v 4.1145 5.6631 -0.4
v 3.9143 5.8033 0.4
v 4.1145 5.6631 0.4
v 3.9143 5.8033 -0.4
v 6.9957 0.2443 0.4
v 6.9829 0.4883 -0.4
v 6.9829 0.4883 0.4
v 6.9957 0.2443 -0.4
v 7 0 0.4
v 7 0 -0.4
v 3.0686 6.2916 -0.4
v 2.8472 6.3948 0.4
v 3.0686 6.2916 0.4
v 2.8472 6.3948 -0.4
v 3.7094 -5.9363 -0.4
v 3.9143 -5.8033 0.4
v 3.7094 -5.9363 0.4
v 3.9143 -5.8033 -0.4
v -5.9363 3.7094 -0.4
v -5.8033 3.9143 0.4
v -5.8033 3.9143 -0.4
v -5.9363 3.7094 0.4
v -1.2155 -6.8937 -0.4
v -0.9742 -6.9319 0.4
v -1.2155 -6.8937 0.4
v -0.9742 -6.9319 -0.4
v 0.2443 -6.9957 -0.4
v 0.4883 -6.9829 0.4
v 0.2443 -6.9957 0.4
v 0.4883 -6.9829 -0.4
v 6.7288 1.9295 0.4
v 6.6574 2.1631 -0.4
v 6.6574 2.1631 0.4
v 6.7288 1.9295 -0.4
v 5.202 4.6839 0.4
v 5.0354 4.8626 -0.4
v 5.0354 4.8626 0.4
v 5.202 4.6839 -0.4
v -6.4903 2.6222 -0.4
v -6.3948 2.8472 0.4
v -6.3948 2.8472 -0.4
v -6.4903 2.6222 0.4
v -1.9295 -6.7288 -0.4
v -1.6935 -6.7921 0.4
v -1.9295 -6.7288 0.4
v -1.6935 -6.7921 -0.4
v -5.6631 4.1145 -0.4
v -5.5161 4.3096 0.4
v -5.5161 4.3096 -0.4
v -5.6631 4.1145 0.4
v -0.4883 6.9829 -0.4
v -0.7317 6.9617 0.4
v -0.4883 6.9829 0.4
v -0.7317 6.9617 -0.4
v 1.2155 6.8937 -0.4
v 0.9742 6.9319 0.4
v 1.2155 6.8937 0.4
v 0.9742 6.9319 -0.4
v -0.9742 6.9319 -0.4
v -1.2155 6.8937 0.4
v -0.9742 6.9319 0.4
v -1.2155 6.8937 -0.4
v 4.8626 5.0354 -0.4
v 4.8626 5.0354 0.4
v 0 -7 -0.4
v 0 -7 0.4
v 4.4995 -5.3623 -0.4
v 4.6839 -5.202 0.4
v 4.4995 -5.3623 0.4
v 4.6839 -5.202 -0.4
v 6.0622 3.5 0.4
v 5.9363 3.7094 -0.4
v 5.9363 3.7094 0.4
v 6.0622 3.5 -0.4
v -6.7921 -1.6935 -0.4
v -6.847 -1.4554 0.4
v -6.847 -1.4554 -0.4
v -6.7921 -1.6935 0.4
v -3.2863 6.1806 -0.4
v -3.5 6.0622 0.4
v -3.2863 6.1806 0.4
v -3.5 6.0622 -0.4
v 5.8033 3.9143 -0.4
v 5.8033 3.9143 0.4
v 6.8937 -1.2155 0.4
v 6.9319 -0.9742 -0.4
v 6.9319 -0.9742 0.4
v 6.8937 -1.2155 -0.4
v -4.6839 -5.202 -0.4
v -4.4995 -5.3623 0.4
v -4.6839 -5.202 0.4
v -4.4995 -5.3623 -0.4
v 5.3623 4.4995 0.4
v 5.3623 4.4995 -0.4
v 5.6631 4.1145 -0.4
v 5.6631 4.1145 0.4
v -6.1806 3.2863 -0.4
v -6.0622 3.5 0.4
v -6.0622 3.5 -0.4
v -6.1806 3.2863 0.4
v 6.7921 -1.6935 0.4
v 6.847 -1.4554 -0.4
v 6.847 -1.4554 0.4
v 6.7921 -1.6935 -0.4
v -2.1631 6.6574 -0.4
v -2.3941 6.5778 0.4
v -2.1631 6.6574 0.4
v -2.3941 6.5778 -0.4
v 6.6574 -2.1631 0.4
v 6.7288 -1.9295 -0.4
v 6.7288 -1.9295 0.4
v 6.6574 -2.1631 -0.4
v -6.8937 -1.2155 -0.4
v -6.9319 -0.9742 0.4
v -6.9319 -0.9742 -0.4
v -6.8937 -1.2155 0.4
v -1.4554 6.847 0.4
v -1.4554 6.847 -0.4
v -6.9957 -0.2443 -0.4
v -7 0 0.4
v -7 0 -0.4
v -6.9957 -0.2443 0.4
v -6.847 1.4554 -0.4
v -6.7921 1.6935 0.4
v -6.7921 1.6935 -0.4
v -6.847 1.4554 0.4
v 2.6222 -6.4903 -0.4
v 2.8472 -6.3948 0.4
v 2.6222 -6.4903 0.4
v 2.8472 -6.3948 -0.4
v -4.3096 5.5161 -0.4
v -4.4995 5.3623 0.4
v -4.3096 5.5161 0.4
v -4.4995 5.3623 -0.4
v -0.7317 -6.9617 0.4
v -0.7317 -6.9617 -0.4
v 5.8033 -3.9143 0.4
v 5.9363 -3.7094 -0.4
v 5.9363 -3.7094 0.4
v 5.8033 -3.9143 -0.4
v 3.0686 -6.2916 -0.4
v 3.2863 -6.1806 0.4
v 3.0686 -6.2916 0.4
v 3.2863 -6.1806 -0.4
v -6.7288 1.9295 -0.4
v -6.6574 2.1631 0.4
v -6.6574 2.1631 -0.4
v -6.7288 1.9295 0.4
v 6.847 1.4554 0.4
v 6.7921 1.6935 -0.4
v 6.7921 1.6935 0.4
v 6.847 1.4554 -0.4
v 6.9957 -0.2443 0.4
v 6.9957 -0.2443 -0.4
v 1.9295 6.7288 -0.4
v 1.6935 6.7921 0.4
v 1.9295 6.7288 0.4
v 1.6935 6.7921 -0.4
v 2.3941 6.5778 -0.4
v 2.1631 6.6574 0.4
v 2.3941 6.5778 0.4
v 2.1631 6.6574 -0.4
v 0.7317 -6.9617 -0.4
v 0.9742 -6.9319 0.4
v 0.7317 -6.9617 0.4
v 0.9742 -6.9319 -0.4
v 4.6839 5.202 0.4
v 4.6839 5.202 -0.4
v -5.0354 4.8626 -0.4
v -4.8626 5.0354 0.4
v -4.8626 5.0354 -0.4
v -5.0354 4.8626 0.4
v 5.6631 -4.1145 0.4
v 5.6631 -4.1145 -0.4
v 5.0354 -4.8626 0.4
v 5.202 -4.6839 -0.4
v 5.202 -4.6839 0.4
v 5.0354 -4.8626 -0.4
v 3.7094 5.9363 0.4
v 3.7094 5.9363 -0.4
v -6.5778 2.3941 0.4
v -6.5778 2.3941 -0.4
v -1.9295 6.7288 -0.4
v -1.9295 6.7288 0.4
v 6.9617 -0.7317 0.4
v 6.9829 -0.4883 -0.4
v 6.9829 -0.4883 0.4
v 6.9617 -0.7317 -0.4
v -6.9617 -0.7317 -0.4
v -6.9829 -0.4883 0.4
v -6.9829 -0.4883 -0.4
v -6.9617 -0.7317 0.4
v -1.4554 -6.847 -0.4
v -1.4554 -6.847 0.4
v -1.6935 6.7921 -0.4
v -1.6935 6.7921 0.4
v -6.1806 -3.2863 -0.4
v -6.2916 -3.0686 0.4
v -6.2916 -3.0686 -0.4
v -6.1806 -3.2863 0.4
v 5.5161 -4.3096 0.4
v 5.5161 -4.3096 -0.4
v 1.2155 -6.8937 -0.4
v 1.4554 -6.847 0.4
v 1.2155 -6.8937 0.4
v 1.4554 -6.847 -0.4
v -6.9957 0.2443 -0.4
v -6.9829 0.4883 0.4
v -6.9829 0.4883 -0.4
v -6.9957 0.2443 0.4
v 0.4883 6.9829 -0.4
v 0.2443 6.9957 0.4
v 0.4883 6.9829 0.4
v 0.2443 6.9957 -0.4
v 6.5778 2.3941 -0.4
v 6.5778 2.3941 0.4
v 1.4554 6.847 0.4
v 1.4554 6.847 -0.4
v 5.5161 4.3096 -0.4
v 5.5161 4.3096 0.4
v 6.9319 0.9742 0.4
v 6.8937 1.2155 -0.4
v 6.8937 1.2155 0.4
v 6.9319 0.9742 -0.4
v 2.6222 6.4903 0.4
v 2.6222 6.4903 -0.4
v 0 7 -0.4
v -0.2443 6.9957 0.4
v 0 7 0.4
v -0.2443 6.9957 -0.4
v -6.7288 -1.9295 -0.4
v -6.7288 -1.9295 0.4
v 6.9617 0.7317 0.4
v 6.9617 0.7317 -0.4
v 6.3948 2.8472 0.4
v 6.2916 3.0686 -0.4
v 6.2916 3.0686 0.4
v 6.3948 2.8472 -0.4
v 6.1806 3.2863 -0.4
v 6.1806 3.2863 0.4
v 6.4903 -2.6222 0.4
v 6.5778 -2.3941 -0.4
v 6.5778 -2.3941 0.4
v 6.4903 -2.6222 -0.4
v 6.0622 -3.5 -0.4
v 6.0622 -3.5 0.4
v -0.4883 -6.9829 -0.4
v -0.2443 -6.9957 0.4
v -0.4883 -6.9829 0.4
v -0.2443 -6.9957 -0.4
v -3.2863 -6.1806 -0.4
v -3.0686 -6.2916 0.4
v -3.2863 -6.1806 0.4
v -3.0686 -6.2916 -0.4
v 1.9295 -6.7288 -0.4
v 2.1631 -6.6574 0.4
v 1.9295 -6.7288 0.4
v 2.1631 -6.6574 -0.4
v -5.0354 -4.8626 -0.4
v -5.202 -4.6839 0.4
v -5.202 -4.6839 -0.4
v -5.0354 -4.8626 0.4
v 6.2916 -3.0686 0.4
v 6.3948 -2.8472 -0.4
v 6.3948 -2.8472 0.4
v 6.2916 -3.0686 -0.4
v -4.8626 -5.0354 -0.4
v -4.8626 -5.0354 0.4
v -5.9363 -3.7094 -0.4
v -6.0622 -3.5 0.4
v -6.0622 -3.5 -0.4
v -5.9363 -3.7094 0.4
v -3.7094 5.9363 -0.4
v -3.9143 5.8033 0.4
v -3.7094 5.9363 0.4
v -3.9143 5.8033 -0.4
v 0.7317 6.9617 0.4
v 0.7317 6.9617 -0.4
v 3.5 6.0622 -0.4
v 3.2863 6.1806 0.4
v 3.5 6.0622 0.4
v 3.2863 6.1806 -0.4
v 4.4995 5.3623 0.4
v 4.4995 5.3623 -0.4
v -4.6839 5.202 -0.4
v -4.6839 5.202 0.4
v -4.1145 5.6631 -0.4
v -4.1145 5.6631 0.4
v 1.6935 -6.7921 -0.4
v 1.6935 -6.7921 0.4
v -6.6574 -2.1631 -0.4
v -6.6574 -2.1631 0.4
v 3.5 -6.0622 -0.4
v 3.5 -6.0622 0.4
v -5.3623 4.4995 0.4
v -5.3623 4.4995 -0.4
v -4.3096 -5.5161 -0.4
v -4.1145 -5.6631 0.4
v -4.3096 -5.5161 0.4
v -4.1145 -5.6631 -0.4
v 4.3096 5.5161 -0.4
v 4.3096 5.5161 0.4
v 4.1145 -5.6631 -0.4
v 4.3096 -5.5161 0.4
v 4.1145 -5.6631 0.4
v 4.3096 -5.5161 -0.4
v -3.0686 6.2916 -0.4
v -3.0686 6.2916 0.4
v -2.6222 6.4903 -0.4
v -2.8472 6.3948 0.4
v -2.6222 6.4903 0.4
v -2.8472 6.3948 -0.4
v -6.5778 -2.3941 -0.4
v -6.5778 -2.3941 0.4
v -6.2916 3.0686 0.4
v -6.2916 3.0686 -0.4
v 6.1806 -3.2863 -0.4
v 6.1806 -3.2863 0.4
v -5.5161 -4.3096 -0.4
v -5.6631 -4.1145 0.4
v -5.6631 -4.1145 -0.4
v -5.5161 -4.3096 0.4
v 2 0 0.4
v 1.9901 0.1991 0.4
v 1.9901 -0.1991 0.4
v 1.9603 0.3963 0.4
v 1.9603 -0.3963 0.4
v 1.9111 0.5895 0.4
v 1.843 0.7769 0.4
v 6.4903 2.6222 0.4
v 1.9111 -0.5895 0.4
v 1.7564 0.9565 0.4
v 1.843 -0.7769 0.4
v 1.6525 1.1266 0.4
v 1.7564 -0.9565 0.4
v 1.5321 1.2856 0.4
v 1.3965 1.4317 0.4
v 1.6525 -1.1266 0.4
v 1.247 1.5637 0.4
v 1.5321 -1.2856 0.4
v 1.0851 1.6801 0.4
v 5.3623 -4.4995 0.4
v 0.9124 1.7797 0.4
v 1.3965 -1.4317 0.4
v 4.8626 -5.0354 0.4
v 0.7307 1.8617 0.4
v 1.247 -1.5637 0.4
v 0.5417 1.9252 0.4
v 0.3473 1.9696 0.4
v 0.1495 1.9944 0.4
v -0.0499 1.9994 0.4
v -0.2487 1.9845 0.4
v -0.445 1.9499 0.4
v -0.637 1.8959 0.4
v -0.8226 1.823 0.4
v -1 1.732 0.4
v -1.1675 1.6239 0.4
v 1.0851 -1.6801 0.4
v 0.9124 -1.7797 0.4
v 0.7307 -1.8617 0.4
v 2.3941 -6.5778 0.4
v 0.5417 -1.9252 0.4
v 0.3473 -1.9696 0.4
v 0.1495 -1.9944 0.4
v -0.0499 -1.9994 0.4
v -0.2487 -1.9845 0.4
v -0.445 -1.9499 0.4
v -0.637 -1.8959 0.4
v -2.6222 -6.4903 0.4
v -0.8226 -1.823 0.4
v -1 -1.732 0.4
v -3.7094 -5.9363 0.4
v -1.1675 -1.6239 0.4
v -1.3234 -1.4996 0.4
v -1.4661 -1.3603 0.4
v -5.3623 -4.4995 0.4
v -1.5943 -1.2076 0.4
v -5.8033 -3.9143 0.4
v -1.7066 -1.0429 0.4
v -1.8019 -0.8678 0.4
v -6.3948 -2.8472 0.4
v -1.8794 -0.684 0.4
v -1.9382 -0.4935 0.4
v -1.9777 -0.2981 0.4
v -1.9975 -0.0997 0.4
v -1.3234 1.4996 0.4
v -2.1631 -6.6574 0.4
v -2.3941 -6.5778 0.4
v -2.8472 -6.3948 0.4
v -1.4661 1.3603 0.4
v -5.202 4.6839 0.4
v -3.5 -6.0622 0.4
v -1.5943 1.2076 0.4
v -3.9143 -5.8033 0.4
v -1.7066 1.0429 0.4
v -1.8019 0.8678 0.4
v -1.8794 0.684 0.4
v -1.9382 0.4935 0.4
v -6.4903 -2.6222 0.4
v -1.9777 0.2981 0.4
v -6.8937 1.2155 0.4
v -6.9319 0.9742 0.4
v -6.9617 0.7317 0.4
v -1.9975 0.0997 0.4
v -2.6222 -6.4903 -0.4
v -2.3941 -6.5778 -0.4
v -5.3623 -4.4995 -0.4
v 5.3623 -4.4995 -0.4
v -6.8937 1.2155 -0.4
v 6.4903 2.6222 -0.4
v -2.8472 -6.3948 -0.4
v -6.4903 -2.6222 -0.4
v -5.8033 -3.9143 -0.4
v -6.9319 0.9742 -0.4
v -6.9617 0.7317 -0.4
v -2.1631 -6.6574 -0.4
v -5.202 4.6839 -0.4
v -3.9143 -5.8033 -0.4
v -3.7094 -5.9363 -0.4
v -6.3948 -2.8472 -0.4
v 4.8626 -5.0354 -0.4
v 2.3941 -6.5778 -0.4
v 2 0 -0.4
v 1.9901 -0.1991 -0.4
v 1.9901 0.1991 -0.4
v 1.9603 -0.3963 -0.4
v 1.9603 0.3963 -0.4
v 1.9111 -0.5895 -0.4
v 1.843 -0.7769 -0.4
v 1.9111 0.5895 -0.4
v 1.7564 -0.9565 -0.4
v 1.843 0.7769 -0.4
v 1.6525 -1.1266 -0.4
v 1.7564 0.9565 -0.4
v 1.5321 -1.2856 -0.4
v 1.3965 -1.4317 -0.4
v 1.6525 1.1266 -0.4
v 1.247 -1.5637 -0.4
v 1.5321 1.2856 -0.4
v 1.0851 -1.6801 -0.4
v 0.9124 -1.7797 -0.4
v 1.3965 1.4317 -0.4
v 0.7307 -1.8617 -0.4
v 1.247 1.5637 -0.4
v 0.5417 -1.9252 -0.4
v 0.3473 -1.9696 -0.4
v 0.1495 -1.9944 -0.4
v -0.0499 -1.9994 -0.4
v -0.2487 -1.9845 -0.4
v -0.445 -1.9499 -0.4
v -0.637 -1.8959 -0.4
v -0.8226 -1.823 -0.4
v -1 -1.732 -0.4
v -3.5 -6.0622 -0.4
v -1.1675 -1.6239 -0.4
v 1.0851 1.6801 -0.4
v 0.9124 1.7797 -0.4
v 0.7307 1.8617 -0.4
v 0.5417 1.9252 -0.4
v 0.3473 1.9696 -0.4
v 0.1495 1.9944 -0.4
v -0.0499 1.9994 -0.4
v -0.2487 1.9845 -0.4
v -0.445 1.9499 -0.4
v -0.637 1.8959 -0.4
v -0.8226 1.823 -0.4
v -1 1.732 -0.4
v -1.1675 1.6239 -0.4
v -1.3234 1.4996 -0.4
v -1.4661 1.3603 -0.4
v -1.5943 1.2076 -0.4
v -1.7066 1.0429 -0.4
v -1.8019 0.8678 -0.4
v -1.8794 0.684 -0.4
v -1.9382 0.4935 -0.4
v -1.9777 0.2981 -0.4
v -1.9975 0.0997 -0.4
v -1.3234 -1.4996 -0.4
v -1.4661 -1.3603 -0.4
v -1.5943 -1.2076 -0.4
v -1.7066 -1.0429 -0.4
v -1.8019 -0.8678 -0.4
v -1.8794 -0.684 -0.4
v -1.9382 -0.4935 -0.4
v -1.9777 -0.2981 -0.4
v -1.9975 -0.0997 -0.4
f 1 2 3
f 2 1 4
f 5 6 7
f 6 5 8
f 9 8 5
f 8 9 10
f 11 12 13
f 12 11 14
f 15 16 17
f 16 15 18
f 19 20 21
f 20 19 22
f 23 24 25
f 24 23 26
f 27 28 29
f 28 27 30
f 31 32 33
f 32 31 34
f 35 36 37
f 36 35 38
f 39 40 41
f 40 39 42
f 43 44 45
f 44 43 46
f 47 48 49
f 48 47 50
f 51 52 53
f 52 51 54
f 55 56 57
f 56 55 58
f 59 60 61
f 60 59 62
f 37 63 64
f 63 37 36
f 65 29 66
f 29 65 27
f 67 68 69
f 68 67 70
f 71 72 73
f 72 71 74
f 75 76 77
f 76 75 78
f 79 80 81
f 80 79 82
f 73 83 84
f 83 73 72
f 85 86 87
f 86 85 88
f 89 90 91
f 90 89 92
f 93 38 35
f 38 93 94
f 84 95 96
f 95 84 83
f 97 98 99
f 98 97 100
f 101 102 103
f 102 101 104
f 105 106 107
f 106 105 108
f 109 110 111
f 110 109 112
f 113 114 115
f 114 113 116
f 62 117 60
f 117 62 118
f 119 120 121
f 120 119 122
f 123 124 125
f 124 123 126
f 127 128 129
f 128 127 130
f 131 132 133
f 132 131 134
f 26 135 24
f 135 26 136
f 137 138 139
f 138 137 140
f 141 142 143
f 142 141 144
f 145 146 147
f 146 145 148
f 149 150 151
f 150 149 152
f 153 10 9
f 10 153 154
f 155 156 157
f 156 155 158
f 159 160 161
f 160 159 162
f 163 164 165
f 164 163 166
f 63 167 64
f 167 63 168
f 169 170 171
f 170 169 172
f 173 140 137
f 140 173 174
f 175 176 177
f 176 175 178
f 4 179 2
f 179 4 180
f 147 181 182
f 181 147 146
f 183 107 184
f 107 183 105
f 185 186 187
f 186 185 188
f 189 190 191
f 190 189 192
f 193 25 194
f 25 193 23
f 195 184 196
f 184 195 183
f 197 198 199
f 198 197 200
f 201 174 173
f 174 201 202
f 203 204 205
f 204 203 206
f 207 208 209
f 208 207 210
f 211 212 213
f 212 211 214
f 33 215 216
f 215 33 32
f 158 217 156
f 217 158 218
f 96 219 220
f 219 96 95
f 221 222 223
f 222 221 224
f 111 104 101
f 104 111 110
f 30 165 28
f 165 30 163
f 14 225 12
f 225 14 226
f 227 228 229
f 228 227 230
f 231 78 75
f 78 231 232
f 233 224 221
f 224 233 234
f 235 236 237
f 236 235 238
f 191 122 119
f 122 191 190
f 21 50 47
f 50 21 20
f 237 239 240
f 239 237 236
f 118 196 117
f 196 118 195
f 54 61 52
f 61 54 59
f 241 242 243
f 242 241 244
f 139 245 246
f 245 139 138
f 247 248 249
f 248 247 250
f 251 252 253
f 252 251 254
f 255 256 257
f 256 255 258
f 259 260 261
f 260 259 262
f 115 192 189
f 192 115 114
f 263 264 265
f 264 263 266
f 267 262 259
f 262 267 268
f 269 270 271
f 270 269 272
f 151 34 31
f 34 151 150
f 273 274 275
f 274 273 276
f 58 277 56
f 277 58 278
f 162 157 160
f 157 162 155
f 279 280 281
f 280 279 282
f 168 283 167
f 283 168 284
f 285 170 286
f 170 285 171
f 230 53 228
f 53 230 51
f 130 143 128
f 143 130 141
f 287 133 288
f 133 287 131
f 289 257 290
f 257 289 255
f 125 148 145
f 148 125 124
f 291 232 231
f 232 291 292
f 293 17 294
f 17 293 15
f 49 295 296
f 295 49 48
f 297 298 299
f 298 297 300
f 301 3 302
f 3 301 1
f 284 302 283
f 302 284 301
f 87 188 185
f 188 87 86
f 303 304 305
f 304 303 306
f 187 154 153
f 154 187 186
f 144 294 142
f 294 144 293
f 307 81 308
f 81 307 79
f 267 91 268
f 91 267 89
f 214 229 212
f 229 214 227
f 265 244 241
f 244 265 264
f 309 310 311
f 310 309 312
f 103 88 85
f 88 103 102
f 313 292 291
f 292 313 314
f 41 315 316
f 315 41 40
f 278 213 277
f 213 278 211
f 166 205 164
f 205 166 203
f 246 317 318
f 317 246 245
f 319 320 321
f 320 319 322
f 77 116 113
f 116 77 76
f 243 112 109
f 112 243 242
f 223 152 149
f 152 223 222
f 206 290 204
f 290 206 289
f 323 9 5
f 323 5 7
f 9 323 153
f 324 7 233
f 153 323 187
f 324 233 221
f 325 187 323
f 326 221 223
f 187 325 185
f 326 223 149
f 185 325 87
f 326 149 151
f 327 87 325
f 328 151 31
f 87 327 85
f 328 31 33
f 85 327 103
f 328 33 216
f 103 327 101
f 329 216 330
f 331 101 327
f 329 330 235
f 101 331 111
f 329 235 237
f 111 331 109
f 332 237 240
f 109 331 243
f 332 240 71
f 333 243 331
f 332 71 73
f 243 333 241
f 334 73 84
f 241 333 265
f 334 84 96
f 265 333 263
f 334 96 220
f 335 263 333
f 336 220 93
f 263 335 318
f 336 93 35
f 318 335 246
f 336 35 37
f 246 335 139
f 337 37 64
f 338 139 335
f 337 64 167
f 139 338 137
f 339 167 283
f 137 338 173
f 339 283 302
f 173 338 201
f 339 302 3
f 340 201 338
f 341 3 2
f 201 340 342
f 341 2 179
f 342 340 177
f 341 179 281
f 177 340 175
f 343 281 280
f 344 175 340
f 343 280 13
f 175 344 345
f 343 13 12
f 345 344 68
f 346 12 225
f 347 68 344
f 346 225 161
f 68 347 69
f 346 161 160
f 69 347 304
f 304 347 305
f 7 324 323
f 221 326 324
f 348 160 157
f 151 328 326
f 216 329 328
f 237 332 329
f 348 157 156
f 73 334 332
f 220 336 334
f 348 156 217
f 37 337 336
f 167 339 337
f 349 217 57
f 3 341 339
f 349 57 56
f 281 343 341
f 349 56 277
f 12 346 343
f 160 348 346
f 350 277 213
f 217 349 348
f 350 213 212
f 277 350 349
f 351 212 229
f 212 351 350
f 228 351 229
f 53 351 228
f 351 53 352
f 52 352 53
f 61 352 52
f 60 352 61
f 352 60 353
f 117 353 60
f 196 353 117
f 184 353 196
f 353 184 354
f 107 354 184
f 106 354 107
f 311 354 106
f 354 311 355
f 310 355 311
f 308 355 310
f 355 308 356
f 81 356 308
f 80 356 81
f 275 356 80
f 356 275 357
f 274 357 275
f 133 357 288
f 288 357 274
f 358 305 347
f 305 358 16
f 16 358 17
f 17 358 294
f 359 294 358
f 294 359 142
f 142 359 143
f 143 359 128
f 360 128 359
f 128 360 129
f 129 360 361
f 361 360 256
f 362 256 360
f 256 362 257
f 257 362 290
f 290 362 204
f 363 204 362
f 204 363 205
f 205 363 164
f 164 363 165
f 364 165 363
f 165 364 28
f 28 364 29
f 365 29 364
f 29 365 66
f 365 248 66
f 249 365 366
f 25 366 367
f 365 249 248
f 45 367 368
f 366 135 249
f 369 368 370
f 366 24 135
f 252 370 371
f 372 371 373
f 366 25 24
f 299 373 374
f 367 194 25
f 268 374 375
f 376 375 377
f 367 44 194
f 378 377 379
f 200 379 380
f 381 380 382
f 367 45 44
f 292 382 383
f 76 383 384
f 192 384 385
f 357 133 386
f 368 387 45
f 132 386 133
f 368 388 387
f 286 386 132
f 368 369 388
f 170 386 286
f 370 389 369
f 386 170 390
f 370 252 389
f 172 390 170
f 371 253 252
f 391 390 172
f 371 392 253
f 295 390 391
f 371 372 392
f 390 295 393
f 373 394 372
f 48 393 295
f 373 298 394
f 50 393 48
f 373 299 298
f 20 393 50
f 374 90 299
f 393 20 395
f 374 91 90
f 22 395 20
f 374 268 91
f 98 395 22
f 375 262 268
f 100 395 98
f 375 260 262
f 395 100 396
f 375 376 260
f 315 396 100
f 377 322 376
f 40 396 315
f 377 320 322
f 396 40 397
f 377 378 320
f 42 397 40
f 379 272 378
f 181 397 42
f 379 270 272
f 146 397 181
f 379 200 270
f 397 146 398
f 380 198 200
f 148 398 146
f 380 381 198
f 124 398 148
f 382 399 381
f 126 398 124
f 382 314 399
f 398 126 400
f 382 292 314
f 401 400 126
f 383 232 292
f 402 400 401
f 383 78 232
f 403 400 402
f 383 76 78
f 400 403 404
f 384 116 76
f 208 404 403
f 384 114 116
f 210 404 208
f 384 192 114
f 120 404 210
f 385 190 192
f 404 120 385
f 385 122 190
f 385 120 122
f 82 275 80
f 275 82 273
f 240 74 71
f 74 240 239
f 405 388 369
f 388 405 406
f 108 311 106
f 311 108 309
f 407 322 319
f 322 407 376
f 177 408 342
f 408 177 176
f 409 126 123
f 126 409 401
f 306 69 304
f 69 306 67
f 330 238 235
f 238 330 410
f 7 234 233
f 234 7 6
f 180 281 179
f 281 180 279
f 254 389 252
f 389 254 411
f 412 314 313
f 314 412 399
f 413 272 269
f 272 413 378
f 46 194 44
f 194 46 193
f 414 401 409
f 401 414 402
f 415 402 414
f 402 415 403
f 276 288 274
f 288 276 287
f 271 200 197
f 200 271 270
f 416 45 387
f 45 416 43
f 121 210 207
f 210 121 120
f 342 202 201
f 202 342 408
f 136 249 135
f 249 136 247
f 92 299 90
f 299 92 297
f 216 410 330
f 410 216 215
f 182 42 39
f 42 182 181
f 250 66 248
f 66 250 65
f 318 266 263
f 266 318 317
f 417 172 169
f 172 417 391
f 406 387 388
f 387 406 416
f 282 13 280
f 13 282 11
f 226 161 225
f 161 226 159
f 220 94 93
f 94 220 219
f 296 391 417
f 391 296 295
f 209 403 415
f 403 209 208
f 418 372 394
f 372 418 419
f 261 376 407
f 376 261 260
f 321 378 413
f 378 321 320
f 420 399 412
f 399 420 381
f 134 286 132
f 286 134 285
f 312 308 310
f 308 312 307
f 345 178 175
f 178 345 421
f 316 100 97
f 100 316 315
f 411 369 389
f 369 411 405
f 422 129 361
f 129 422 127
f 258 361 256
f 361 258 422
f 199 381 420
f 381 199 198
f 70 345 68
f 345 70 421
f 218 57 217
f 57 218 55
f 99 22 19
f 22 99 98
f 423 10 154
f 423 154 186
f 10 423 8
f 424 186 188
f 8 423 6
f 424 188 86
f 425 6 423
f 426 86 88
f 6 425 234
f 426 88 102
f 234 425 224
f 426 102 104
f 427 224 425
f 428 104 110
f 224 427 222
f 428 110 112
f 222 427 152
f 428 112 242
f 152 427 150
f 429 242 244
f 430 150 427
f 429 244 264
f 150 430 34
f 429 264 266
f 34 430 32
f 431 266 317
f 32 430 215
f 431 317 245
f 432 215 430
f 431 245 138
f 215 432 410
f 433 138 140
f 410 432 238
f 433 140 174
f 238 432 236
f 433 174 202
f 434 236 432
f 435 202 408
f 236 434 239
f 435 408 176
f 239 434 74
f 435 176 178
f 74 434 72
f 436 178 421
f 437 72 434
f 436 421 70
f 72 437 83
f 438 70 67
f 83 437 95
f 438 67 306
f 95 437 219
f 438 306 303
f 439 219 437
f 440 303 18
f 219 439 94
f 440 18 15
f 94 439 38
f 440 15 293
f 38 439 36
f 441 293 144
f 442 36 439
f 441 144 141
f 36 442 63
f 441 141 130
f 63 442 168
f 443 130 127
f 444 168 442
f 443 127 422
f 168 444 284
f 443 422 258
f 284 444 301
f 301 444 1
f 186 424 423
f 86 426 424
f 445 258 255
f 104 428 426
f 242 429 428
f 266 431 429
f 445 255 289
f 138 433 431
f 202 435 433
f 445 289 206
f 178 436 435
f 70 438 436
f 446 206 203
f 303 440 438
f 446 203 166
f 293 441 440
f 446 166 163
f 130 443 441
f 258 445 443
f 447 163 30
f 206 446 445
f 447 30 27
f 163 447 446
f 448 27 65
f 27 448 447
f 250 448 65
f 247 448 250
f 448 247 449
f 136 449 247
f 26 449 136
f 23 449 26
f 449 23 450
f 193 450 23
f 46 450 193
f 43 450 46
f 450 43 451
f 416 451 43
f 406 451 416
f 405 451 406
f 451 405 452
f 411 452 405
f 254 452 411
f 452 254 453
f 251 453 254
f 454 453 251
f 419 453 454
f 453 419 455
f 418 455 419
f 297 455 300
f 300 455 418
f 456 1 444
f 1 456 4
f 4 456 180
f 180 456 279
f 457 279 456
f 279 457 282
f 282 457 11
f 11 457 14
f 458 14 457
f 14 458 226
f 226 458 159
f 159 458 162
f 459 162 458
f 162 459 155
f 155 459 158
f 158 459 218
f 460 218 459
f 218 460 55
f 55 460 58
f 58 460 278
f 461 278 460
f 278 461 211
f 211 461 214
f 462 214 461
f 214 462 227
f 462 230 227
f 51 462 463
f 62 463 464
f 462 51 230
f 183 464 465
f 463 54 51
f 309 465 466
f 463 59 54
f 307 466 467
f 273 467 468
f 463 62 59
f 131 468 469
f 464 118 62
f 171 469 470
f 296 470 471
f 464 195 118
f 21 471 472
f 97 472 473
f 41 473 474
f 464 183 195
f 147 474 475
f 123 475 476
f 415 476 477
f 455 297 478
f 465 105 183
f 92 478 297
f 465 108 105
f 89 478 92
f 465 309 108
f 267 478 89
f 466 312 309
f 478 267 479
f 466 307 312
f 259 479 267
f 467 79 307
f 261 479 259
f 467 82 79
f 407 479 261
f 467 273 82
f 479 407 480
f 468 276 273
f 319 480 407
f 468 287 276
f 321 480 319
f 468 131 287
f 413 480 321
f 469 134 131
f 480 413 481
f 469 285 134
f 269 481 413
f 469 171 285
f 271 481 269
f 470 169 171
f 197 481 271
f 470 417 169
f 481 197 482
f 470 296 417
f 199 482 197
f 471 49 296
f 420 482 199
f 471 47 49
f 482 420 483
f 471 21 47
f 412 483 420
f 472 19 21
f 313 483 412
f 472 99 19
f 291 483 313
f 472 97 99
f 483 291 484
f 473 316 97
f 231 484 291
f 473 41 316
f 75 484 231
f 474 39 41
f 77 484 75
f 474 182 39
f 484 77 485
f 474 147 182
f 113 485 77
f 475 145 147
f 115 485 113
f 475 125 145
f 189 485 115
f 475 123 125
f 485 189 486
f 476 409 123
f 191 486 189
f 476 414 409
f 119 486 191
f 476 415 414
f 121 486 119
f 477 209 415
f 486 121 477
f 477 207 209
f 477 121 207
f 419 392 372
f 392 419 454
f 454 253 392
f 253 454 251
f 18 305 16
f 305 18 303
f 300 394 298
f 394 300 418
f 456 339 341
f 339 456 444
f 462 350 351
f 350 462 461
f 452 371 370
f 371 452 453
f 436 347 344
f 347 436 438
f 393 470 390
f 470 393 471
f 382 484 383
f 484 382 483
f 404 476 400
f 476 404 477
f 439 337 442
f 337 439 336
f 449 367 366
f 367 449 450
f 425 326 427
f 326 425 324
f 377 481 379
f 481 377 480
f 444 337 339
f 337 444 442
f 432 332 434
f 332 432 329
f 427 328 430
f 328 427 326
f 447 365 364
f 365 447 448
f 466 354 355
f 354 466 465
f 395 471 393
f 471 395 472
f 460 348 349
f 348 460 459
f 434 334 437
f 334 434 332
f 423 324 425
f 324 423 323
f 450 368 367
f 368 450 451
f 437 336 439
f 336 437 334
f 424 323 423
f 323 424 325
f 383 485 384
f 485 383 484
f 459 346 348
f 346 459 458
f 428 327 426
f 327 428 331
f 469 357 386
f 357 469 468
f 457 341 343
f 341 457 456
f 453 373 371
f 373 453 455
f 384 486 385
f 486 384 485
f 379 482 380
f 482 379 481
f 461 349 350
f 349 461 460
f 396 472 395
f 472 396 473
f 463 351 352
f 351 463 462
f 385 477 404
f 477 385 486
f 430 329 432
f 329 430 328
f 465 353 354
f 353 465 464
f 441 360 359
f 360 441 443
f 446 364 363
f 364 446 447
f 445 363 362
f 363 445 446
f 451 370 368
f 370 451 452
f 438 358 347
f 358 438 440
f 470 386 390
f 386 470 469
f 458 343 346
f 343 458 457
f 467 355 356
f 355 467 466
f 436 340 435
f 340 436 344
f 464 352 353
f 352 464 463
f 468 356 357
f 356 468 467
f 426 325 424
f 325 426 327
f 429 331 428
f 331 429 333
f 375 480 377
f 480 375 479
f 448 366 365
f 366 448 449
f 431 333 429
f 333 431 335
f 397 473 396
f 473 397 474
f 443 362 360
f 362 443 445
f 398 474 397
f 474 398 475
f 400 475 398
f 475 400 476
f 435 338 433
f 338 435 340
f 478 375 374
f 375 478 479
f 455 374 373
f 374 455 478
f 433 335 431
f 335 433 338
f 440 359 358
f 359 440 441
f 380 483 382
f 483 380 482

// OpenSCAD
// Penny washer: 4.0mm ID, 14.0mm OD, 0.8mm thickness

outer_diameter = 14.0;   // mm
inner_diameter = 4.0;    // mm
thickness      = 0.8;    // mm

// Make circles truly round in preview/renders
$fa = 2;     // max angle per fragment (deg)
$fs = 0.2;   // max fragment size (mm)

overlap = 0.2; // ensures clean subtraction

difference() {
    cylinder(d=outer_diameter, h=thickness, center=true);
    cylinder(d=inner_diameter, h=thickness + 2*overlap, center=true);
}
